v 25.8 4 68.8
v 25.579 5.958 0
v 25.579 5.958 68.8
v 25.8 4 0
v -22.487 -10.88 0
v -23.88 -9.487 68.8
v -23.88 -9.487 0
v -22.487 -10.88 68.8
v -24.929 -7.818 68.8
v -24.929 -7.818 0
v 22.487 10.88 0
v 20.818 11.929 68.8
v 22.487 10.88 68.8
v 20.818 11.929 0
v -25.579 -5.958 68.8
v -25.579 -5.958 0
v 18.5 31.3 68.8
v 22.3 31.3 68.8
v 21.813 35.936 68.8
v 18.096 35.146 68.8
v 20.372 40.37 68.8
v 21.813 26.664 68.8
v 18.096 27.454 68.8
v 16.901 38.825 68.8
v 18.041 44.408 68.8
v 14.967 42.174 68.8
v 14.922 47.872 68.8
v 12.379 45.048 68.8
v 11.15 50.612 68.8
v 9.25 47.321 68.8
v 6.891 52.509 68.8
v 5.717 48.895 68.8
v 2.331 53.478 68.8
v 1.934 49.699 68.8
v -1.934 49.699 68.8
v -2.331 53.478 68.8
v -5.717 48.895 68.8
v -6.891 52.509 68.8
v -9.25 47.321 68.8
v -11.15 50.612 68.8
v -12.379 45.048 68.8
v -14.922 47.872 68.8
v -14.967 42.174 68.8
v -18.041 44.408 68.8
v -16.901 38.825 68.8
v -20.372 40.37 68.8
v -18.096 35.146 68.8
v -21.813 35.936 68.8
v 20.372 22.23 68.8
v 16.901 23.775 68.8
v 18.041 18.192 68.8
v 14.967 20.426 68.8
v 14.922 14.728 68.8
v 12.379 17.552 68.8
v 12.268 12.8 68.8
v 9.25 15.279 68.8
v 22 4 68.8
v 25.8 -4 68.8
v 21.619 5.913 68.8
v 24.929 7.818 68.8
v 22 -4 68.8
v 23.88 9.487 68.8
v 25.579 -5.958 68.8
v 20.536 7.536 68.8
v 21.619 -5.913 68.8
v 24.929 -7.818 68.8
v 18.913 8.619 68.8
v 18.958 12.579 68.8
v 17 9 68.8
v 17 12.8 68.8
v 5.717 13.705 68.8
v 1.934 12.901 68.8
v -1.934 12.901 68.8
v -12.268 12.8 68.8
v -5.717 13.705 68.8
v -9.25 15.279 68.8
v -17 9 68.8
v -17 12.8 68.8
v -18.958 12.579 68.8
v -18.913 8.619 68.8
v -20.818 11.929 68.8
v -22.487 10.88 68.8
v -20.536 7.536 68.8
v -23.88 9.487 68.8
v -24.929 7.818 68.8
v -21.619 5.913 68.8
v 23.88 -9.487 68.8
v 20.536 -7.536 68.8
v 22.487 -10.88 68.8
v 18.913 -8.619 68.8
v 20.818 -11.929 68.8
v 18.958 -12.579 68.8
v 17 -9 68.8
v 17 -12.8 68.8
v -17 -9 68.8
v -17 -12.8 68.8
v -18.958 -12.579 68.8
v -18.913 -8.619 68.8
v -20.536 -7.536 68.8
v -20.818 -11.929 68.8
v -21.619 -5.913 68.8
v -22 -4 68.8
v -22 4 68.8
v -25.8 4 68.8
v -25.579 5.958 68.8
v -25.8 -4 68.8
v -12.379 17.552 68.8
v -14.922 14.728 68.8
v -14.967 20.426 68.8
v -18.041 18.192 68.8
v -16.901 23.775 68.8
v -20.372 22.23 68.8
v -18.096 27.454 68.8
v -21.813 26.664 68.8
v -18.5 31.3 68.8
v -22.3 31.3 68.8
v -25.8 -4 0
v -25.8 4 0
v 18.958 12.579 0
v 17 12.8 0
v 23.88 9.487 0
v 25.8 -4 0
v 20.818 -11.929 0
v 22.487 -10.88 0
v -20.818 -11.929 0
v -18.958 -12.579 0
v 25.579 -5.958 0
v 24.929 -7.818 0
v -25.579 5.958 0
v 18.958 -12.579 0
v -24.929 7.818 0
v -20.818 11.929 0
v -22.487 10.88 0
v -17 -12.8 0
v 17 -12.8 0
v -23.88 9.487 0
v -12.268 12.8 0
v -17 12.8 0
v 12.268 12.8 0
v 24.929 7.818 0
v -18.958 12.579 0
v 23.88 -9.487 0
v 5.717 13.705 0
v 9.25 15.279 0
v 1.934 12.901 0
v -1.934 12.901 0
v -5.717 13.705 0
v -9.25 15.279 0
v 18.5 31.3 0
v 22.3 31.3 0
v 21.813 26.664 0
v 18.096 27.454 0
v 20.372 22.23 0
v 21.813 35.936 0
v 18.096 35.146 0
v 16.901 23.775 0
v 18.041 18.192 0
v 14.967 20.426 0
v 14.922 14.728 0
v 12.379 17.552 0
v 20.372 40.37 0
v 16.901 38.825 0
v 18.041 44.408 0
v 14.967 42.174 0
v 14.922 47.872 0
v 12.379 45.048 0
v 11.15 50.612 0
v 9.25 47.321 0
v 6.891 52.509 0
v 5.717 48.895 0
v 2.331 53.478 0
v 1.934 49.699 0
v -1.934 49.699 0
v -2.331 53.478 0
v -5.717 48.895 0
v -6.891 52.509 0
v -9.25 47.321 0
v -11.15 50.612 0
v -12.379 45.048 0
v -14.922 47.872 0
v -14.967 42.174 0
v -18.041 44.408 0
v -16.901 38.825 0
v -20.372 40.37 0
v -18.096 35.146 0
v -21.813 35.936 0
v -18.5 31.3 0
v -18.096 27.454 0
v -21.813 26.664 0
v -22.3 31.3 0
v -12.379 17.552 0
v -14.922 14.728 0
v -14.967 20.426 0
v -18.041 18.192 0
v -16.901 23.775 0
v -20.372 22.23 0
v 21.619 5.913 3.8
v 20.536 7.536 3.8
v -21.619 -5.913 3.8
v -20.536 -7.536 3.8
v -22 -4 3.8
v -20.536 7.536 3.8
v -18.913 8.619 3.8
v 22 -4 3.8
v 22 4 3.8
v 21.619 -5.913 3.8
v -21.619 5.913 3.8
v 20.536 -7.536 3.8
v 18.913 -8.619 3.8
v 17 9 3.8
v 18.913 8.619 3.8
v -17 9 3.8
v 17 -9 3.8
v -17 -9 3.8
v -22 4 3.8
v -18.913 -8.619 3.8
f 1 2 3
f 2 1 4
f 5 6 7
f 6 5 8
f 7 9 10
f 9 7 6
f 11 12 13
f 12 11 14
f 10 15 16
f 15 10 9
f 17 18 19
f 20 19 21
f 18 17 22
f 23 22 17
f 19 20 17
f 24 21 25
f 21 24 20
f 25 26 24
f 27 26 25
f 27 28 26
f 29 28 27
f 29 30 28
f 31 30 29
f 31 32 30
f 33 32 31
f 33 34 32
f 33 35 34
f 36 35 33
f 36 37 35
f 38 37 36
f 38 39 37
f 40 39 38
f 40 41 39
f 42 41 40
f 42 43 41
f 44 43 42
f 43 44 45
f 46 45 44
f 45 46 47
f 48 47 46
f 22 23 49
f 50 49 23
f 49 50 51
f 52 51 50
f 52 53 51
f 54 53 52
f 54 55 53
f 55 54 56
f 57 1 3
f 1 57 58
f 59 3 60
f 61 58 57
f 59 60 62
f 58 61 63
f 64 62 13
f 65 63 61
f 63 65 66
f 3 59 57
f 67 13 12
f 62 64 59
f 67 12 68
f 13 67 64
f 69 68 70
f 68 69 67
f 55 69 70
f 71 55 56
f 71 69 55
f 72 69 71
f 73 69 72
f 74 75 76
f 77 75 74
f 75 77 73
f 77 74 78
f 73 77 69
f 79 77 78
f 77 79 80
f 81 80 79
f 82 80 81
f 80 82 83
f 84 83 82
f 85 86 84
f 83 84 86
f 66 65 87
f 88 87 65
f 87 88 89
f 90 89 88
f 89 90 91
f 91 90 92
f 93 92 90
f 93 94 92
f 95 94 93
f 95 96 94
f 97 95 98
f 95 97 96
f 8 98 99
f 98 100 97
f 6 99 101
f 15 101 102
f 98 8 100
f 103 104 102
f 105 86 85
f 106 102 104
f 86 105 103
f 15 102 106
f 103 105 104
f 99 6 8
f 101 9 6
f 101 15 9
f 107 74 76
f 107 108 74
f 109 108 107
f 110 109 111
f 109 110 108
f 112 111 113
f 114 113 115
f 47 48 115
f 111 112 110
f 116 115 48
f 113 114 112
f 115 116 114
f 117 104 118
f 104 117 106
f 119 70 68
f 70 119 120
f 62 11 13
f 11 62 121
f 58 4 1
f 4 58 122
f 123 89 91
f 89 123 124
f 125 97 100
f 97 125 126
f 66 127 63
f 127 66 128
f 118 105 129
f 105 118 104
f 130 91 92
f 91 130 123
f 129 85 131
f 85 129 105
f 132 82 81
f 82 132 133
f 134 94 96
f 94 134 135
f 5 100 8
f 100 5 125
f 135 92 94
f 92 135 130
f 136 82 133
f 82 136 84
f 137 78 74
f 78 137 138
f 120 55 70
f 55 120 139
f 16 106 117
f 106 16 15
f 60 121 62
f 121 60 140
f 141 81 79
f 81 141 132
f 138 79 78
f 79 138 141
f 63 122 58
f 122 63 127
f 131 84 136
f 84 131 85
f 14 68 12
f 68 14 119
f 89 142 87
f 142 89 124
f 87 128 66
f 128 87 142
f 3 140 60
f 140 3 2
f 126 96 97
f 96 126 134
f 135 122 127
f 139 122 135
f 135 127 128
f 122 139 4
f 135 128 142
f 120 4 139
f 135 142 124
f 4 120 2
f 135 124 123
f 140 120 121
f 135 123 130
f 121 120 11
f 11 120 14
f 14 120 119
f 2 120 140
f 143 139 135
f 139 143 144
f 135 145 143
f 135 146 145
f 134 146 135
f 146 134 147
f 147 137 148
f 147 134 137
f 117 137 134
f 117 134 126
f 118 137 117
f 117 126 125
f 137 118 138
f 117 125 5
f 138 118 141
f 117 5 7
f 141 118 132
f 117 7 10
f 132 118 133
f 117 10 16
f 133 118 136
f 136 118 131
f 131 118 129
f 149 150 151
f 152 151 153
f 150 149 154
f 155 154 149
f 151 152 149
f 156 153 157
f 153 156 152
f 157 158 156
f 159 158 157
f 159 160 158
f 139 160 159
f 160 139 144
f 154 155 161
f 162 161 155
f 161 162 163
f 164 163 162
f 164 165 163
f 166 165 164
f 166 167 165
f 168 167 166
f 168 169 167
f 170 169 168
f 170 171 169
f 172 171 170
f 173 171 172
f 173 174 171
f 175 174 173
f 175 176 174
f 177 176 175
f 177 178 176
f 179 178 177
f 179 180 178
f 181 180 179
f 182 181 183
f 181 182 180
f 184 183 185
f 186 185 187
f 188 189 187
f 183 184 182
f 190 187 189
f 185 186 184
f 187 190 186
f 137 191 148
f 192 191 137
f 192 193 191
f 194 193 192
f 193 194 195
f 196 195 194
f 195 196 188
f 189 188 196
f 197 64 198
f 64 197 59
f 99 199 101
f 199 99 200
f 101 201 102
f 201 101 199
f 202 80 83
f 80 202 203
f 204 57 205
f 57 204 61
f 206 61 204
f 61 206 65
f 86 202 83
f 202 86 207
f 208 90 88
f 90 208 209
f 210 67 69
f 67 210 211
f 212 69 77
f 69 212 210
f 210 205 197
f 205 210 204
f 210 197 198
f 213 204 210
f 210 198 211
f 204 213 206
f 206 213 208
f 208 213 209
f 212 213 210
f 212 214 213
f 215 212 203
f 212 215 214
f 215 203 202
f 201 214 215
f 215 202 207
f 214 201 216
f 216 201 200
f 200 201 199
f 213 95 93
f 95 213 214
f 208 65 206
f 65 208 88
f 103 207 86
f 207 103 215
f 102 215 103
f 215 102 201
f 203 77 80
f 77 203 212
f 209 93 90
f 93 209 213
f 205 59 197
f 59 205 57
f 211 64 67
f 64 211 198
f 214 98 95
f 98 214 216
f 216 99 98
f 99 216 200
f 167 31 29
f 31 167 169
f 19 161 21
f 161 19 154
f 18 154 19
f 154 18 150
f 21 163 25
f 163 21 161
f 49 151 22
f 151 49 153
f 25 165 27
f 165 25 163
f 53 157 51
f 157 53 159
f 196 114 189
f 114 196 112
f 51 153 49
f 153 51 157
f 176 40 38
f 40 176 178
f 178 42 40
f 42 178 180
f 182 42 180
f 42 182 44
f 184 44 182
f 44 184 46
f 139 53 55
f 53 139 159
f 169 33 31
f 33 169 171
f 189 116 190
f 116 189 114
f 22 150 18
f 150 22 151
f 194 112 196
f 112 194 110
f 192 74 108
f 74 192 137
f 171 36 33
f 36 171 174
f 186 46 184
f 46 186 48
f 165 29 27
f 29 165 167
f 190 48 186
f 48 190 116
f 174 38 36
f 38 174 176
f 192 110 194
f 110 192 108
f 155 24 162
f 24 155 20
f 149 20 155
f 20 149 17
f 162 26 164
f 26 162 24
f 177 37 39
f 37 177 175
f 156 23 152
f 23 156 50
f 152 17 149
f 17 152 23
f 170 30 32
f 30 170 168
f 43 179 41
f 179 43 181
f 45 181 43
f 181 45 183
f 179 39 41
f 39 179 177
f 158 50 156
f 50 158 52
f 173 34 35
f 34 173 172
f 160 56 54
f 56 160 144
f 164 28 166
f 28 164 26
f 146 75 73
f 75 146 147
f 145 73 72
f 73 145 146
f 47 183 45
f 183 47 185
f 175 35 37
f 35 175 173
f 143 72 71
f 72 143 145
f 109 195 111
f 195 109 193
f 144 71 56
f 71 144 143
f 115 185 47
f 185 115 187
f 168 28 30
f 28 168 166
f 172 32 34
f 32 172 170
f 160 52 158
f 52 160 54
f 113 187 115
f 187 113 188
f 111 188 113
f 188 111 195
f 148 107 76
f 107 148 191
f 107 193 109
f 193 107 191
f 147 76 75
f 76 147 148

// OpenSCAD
/* [Remote controller dimensions] */

// Remote controller width
cWidth = 44;

// Remote controller height
cHeight = 18;

// Depth of the pocket (Remote controller length)
cLength = 65;

/* [Rod paremeters] */

// Diameter of the rod
rodDiameter = 37;

/* [Common parameters] */

// Corner radius
cRadius = 5;

// Wall thickness
wThickness=3.8;


module roundedRect(size, radius)
{
  x = size[0];
  y = size[1];
  z = size[2];

  linear_extrude(height=z)
  hull()
  {
    // place 4 circles in the corners, with the given radius
    translate([(-x/2)+(radius), (-y/2)+(radius), 0])
    circle(r=radius);

    translate([(x/2)-(radius), (-y/2)+(radius), 0])
    circle(r=radius);

    translate([(-x/2)+(radius), (y/2)-(radius), 0])
    circle(r=radius);

    translate([(x/2)-(radius), (y/2)-(radius), 0])
    circle(r=radius);
  }
}


module controllerBox(width, height, length, thickness, radius) {
     
    difference() {
      roundedRect([width+2*thickness, 
                    height+2*thickness,
                    length+thickness], 
        radius=radius+thickness);
    
      translate([0,0,thickness]) {
        roundedRect([width,height,length+thickness],radius=radius);    
      }
    }   
}


module rodGrip(diameter, height, thickness, screwDiameter) {

    difference() {
      cylinder(d=diameter+2*thickness, h=height);
    
      translate([0,0,-1]) {
        cylinder(d=diameter, h=height+2);
      }
    }
}



controllerBox(cWidth,cHeight,cLength,wThickness,cRadius);
translate([0,rodDiameter/2+cHeight/2+wThickness,0]) {    
  rodGrip(rodDiameter, cLength+wThickness, wThickness, 3);
}
